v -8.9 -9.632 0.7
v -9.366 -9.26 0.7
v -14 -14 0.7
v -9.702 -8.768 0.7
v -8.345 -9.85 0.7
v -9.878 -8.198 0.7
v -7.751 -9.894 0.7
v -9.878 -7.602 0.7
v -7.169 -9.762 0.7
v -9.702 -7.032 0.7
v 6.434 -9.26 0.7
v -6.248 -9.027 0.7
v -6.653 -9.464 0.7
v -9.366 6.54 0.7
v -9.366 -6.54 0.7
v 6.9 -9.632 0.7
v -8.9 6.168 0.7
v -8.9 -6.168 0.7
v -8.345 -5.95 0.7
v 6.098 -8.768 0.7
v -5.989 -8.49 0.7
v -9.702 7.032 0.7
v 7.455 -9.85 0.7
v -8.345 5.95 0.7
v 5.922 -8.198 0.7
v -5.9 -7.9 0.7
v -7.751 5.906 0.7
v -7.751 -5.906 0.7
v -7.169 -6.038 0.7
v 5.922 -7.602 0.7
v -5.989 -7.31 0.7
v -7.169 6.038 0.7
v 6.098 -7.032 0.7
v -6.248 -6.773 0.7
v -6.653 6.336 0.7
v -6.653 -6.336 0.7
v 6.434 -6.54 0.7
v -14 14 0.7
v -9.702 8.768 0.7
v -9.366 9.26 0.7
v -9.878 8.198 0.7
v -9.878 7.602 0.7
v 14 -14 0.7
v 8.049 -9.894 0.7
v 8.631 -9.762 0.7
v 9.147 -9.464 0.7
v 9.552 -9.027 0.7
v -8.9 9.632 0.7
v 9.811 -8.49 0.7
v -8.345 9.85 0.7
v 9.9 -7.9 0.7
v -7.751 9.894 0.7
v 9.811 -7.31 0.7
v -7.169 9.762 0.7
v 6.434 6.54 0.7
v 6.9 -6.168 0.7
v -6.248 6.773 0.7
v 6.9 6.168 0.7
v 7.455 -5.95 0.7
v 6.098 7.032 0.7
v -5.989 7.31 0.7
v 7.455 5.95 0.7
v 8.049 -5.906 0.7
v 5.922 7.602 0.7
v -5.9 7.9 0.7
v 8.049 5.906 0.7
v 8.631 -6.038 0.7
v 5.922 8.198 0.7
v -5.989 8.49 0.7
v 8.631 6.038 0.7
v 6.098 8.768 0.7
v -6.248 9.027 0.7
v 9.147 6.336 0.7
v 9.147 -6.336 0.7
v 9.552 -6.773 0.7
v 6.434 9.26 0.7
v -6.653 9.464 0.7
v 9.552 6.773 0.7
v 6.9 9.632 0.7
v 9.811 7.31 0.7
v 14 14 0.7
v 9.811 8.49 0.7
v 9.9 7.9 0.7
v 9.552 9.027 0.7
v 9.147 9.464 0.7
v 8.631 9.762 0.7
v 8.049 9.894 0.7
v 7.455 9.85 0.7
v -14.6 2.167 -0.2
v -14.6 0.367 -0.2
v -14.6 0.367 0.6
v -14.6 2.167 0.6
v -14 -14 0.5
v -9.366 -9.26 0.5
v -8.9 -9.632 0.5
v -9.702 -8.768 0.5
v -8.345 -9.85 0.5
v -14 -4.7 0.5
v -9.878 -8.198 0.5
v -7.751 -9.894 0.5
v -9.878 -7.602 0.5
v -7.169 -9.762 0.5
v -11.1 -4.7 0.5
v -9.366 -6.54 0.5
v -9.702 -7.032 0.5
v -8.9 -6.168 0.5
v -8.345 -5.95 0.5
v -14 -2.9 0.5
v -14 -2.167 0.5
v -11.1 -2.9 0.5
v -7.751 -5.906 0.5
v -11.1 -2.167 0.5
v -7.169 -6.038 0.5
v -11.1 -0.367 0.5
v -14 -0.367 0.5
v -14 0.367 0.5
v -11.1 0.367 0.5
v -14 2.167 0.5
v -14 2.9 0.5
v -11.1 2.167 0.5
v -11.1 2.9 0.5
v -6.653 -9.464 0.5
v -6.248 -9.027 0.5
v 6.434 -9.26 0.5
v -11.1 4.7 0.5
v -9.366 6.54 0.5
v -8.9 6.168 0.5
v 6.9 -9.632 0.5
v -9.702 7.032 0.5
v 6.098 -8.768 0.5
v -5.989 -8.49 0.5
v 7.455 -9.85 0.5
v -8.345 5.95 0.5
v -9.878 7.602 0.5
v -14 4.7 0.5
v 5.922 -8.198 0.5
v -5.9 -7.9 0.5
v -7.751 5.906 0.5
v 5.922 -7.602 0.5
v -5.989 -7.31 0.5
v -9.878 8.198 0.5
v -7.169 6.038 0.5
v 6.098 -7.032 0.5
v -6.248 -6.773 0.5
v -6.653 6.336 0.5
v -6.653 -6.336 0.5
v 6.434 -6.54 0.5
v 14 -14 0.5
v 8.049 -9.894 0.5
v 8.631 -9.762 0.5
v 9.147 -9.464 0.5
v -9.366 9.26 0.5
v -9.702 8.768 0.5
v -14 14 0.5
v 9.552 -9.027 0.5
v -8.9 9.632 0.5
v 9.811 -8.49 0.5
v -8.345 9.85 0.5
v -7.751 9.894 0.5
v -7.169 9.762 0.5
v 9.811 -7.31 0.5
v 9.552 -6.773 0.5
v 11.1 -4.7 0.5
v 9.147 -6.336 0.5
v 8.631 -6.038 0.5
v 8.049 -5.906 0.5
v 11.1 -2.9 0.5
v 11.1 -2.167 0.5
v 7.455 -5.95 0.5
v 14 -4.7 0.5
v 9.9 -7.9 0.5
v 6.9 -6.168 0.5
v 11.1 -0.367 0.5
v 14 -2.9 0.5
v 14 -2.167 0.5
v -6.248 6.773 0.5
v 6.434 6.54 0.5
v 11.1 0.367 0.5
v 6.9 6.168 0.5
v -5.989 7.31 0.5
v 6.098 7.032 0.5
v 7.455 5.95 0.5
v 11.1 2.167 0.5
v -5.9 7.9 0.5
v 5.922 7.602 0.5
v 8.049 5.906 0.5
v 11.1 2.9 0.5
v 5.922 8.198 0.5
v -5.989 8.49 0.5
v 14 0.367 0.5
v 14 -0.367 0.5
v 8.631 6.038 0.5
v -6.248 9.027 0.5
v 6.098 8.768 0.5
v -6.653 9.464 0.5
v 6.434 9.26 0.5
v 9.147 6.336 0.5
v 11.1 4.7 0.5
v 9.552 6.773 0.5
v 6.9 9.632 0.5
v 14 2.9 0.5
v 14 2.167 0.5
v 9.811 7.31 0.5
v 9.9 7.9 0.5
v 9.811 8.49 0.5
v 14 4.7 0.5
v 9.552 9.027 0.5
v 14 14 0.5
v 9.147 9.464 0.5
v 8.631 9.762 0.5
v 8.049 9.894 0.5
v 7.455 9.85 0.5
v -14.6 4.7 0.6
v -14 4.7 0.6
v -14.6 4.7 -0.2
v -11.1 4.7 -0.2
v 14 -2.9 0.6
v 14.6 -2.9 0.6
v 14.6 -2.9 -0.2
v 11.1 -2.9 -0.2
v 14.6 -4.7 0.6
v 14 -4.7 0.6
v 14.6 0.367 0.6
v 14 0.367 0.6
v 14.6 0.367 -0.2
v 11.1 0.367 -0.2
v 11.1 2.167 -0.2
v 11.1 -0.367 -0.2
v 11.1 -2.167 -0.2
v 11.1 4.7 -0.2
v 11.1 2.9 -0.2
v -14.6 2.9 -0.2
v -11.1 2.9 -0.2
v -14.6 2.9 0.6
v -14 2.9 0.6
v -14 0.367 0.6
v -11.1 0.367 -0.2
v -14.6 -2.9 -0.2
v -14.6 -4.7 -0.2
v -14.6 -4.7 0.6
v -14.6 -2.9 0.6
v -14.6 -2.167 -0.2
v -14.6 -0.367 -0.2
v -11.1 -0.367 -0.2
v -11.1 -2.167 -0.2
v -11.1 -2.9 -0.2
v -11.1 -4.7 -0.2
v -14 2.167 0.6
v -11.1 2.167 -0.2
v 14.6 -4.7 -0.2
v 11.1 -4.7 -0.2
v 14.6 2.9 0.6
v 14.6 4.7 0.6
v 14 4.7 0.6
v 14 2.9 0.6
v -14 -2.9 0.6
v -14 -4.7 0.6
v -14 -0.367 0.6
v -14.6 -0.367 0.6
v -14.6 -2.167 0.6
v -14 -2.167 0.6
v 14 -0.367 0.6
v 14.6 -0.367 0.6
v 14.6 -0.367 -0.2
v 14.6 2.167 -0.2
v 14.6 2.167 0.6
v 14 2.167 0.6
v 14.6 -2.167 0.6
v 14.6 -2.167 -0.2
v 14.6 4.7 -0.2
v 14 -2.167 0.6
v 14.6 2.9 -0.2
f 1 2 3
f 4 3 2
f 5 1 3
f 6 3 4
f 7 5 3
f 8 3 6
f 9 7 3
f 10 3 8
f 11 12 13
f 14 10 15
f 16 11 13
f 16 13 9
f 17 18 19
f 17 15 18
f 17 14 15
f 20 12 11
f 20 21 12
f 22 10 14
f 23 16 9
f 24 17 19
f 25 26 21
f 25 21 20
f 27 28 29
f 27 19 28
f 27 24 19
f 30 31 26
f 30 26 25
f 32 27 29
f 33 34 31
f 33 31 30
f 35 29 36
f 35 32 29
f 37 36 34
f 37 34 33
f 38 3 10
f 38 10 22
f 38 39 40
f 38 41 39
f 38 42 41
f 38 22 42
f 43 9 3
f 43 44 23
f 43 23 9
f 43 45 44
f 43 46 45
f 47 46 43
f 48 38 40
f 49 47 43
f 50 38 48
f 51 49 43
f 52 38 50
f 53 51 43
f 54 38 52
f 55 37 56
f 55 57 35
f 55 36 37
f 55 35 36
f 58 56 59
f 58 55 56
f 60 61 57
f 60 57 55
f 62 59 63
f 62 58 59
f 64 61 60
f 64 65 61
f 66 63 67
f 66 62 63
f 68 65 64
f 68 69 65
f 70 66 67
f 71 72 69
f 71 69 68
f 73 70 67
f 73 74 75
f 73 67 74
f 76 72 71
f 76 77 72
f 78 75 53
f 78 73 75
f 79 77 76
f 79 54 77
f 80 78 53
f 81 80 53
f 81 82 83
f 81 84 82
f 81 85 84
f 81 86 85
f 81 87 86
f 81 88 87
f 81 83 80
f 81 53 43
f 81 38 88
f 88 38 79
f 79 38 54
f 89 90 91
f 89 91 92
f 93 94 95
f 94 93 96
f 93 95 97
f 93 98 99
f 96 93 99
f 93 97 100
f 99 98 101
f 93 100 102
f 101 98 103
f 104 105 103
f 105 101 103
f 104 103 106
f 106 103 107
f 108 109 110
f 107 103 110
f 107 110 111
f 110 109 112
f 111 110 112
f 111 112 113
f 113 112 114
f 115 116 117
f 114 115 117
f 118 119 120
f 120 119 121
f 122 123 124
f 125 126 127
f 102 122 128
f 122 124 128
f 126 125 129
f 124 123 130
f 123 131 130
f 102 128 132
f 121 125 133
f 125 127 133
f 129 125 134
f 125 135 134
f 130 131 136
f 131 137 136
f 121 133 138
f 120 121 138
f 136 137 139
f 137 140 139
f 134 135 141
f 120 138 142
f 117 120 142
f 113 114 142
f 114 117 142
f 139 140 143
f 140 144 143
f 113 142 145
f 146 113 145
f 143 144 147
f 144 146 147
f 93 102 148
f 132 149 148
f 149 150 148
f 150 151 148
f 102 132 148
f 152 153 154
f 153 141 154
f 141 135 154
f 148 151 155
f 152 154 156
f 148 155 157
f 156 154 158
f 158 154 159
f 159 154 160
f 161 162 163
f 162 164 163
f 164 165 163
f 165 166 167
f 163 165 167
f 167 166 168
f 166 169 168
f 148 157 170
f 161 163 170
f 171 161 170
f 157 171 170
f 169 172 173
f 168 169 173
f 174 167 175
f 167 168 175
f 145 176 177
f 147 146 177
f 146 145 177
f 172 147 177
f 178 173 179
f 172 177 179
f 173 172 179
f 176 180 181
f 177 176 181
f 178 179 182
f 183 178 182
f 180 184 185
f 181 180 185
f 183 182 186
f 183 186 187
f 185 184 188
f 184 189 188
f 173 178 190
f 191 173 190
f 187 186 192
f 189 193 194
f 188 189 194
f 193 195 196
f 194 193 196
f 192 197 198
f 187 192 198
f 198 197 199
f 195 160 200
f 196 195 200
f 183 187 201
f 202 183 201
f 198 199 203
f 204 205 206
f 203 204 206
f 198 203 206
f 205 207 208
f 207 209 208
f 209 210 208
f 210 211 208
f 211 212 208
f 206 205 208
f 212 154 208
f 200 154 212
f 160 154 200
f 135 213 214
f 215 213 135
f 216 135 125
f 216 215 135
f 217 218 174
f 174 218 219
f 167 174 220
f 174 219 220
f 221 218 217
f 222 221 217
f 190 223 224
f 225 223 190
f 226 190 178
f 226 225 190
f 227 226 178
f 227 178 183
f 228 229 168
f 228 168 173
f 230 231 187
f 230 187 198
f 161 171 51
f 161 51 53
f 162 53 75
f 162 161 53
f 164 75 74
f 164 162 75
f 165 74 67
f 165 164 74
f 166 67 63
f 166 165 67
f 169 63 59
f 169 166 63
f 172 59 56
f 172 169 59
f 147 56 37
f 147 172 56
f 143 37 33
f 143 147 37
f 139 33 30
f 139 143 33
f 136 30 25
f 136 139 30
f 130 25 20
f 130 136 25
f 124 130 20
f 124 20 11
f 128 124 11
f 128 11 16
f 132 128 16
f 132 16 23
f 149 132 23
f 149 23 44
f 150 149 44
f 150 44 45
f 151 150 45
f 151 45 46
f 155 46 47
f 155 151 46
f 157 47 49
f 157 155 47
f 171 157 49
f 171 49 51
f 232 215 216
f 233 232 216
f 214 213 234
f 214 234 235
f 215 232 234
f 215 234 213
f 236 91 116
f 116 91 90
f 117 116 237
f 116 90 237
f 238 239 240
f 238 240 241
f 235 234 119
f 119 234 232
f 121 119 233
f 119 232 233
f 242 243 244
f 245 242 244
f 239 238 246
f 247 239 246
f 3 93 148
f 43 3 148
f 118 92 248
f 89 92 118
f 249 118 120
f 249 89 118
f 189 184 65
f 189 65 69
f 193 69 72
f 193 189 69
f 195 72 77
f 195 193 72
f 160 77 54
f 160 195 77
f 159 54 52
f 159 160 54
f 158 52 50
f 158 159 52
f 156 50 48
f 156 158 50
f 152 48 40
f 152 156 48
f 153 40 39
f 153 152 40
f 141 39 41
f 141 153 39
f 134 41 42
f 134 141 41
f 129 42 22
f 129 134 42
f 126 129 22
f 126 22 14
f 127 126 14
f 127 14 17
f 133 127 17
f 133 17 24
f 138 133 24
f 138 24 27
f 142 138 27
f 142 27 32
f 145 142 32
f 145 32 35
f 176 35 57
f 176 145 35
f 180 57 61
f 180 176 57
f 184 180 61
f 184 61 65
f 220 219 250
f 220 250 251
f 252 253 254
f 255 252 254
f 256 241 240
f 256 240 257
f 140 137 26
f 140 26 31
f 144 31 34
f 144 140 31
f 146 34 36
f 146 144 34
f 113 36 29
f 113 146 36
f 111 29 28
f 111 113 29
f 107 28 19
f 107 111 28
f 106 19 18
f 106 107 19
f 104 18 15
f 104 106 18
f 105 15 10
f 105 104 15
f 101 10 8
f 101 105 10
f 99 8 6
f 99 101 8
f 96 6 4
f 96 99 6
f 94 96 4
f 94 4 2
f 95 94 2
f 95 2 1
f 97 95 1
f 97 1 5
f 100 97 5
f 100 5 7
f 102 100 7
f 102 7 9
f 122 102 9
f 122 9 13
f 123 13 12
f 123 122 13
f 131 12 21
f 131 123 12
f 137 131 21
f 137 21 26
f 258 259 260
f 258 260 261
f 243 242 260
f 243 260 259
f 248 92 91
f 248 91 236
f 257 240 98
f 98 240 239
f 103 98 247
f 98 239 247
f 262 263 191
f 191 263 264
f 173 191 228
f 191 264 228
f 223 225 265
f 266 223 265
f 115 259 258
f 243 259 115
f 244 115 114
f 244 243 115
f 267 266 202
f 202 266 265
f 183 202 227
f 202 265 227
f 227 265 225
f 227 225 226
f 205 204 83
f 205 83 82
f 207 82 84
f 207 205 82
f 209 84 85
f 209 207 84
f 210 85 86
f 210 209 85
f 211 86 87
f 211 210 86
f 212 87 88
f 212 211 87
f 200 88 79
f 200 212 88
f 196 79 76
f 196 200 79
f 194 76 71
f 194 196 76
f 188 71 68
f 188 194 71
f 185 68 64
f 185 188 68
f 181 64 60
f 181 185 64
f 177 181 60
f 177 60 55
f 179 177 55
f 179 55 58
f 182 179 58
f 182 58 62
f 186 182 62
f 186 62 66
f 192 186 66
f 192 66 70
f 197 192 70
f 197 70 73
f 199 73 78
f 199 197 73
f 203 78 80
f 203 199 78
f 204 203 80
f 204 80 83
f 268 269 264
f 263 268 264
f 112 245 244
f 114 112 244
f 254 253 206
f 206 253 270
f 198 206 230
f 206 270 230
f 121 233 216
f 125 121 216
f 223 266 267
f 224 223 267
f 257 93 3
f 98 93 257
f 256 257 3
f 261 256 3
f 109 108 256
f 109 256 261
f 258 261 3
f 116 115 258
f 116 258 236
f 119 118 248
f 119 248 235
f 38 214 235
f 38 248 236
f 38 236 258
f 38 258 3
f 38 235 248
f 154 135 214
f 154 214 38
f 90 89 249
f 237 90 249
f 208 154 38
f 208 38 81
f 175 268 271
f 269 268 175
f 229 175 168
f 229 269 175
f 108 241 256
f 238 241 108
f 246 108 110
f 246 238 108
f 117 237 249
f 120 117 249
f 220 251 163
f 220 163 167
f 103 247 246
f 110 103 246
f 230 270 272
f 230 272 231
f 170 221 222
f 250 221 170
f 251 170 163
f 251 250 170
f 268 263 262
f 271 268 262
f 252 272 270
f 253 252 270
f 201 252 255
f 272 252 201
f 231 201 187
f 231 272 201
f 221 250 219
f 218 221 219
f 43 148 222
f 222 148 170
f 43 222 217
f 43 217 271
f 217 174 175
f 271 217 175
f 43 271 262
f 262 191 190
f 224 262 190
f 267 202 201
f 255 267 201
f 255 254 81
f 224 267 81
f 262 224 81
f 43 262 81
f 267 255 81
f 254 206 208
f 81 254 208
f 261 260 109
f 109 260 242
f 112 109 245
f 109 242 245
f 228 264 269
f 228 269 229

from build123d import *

# Parameters (mm, degrees)
SKETCH004_W                     = 28
SKETCH004_H                     = 28
SKETCH004_R                     = 2
PAD004_DEPTH                    = 0.2
SKETCH005_W                     = 3.5
SKETCH005_H                     = 1.8
PAD005_DEPTH                    = 0.8
SKETCH005_LINEARPATTERN003_2_W  = 3.5
SKETCH005_LINEARPATTERN003_2_H  = 1.8
PAD005_LINEARPATTERN003_2_DEPTH = 0.8
SKETCH005_LINEARPATTERN003_3_W  = 3.5
SKETCH005_LINEARPATTERN003_3_H  = 1.8
PAD005_LINEARPATTERN003_3_DEPTH = 0.8
SKETCH005_LINEARPATTERN003_4_W  = 3.5
SKETCH005_LINEARPATTERN003_4_H  = 1.8
PAD005_LINEARPATTERN003_4_DEPTH = 0.8


with BuildPart() as part:
    # Sketch004 → Pad004 (new body)
    with BuildSketch(Plane.XY.offset(0.5)):
        Rectangle(SKETCH004_W, SKETCH004_H)
        with Locations((-7.9, 7.9)):
            Circle(SKETCH004_R, mode=Mode.SUBTRACT)
        with Locations((7.9, 7.9)):
            Circle(SKETCH004_R, mode=Mode.SUBTRACT)
        with Locations((7.9, -7.9)):
            Circle(SKETCH004_R, mode=Mode.SUBTRACT)
        with Locations((-7.9, -7.9)):
            Circle(SKETCH004_R, mode=Mode.SUBTRACT)
    extrude(amount=PAD004_DEPTH)

    # Sketch005 → Pad005 (join)
    with BuildSketch(Plane.XY.offset(-0.2)):
        with Locations((-12.85, -3.8)):
            Rectangle(SKETCH005_W, SKETCH005_H)
    pad005 = extrude(amount=PAD005_DEPTH)

    # Sketch005 LinearPattern003 2 → Pad005 LinearPattern003 2 (add)
    with BuildSketch(Plane(origin=(0, 2.5333333333, -0.2), x_dir=(1, 0, 0), z_dir=(0, 0, 1))):
        with Locations((-12.85, -3.8)):
            Rectangle(SKETCH005_LINEARPATTERN003_2_W, SKETCH005_LINEARPATTERN003_2_H)
    pad005_linearpattern003_2 = extrude(amount=PAD005_LINEARPATTERN003_2_DEPTH)

    # Sketch005 LinearPattern003 3 → Pad005 LinearPattern003 3 (add)
    with BuildSketch(Plane(origin=(0, 5.0666666667, -0.2), x_dir=(1, 0, 0), z_dir=(0, 0, 1))):
        with Locations((-12.85, -3.8)):
            Rectangle(SKETCH005_LINEARPATTERN003_3_W, SKETCH005_LINEARPATTERN003_3_H)
    pad005_linearpattern003_3 = extrude(amount=PAD005_LINEARPATTERN003_3_DEPTH)

    # Sketch005 LinearPattern003 4 → Pad005 LinearPattern003 4 (add)
    with BuildSketch(Plane(origin=(0, 7.6, -0.2), x_dir=(1, 0, 0), z_dir=(0, 0, 1))):
        with Locations((-12.85, -3.8)):
            Rectangle(SKETCH005_LINEARPATTERN003_4_W, SKETCH005_LINEARPATTERN003_4_H)
    pad005_linearpattern003_4 = extrude(amount=PAD005_LINEARPATTERN003_4_DEPTH)

    # Mirrored001: Pad005, Pad005 LinearPattern003 2, Pad005 LinearPattern003 3, Pad005 LinearPattern003 4 across YZ
    add(pad005.mirror(Plane.YZ))
    add(pad005_linearpattern003_2.mirror(Plane.YZ))
    add(pad005_linearpattern003_3.mirror(Plane.YZ))
    add(pad005_linearpattern003_4.mirror(Plane.YZ))


solid = part.part
